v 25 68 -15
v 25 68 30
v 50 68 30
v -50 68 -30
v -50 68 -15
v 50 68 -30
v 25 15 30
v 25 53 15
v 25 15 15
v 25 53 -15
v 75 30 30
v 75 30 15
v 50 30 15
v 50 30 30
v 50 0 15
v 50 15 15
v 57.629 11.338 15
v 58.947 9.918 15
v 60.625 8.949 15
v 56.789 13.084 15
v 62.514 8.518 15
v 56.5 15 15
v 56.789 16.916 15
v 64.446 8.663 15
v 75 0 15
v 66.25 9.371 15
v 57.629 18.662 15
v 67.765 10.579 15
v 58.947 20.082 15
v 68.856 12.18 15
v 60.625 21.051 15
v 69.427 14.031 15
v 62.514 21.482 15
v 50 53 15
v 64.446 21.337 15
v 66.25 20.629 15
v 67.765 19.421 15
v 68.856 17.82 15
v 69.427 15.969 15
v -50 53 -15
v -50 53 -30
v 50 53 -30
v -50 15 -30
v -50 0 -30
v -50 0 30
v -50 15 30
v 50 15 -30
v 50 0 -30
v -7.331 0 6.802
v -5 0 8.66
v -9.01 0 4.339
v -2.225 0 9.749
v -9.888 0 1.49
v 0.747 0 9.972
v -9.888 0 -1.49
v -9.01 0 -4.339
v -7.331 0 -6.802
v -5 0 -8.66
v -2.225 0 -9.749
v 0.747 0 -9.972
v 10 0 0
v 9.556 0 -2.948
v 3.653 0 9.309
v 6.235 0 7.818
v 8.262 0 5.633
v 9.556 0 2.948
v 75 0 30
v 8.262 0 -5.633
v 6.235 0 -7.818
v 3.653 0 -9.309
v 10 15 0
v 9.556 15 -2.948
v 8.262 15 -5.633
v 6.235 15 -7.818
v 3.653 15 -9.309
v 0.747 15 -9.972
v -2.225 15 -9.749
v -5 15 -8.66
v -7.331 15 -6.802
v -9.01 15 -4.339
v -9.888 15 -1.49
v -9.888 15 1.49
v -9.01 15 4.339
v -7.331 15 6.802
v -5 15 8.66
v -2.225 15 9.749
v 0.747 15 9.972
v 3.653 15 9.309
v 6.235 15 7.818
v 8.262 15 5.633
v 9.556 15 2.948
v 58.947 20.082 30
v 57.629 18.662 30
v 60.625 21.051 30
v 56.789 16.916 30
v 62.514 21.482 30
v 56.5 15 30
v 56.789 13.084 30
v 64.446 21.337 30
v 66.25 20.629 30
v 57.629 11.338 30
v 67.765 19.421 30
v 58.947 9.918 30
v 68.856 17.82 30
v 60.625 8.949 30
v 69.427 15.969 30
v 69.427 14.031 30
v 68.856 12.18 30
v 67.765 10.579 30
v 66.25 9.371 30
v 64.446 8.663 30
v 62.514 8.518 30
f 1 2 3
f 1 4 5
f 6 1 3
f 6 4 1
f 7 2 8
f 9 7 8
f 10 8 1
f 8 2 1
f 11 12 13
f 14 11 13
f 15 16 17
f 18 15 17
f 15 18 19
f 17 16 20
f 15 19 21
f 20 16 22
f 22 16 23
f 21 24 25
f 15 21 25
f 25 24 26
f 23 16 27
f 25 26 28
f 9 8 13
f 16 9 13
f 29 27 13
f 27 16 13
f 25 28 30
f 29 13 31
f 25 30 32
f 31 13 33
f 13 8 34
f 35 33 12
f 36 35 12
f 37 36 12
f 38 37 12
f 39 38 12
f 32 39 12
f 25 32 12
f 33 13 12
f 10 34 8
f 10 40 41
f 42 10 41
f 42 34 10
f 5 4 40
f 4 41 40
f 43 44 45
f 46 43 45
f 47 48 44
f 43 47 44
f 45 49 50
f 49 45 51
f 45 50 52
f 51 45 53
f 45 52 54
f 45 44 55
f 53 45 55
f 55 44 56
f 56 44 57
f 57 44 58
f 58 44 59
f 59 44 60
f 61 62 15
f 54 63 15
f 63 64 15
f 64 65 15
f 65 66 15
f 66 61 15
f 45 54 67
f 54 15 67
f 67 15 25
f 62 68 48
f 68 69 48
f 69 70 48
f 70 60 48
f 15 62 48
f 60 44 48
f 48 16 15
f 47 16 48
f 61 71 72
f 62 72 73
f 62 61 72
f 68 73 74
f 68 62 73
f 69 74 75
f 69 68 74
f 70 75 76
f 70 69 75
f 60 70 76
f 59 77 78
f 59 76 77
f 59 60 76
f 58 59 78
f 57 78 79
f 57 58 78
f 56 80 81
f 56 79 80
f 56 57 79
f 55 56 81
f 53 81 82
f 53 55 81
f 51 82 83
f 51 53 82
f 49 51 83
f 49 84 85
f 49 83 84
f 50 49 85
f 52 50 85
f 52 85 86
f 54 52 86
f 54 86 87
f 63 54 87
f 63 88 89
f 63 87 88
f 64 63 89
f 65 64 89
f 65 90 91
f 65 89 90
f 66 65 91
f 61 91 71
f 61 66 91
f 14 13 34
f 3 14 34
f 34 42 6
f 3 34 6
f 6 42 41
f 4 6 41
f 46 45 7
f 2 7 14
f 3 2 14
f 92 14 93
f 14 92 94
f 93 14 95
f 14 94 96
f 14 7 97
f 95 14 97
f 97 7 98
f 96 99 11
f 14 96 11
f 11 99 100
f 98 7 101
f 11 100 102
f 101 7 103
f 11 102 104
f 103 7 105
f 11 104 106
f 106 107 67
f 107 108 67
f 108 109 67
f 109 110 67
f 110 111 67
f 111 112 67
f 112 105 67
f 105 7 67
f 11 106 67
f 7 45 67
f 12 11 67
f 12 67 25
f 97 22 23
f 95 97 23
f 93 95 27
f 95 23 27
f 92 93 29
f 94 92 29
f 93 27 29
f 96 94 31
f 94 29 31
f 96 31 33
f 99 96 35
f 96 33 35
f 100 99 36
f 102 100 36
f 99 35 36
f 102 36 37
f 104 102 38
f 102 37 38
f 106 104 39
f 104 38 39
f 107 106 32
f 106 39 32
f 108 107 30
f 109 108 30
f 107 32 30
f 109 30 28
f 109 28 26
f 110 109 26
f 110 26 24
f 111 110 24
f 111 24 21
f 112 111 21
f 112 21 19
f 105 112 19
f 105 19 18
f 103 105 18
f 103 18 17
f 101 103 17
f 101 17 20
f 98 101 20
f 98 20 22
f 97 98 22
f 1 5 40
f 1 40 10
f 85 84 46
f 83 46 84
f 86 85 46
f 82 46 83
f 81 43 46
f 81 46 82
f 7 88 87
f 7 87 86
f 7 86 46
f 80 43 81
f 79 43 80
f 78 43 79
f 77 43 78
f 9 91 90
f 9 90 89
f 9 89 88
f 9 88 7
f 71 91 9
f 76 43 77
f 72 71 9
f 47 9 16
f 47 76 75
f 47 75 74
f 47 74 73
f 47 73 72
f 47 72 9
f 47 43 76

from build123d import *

# Parameters (mm, degrees)
SKETCH1_R           = 10
BOSS_EXTRUDE1_DEPTH = 68
SKETCH3_W           = 45
SKETCH3_H           = 38
CUT_EXTRUDE1_DEPTH  = 126
SKETCH4_W           = 75
SKETCH4_H           = 45
SKETCH4_W_2         = 25
CUT_EXTRUDE2_DEPTH  = 53
SKETCH4_2_W         = 25
SKETCH4_2_H         = 45
CUT_EXTRUDE3_DEPTH  = 69
SKETCH5_R           = 6.5
SKETCH5_W           = 25
SKETCH5_H           = 38
CUT_EXTRUDE4_DEPTH  = 16


with BuildPart() as part:
    # Sketch1 → Boss-Extrude1 (new body)
    with BuildSketch(Plane(origin=(0, 0, 0), x_dir=(1, 0, 0), z_dir=(0, 1, 0))):
        Polygon((-50, -30), (50, -30), (75, -30), (75, 30), (50, 30), (-50, 30), align=None)
        Circle(SKETCH1_R, mode=Mode.SUBTRACT)
    extrude(amount=BOSS_EXTRUDE1_DEPTH)

    # Sketch3 → Cut-Extrude1 (cut, through all)
    with BuildSketch(Plane(origin=(75, 0, 0), x_dir=(0, 0, -1), z_dir=(1, 0, 0))):
        with Locations((7.5, 34)):
            Rectangle(SKETCH3_W, SKETCH3_H)
    extrude(amount=-CUT_EXTRUDE1_DEPTH, mode=Mode.SUBTRACT)

    # Sketch4 → Cut-Extrude2 (cut)
    with BuildSketch(Plane(origin=(0, 68, 0), x_dir=(1, 0, 0), z_dir=(0, 1, 0))):
        with Locations((-12.5, -7.5)):
            Rectangle(SKETCH4_W, SKETCH4_H)
        with Locations((62.5, 7.5)):
            Rectangle(SKETCH4_W_2, SKETCH4_H)
    extrude(amount=-CUT_EXTRUDE2_DEPTH, mode=Mode.SUBTRACT)

    # Sketch4<2> → Cut-Extrude3 (cut, through all)
    with BuildSketch(Plane(origin=(0, 68, 0), x_dir=(1, 0, 0), z_dir=(0, 1, 0))):
        with Locations((62.5, 7.5)):
            Rectangle(SKETCH4_2_W, SKETCH4_2_H)
    extrude(amount=-CUT_EXTRUDE3_DEPTH, mode=Mode.SUBTRACT)

    # Sketch5 → Cut-Extrude4 (cut, through all)
    with BuildSketch(Plane(origin=(0, 0, 15), x_dir=(-1, 0, 0), z_dir=(0, 0, -1))):
        with Locations((-63, 15)):
            Circle(SKETCH5_R)
        with Locations((-62.5, 49)):
            Rectangle(SKETCH5_W, SKETCH5_H)
    extrude(amount=-CUT_EXTRUDE4_DEPTH, mode=Mode.SUBTRACT)


solid = part.part
